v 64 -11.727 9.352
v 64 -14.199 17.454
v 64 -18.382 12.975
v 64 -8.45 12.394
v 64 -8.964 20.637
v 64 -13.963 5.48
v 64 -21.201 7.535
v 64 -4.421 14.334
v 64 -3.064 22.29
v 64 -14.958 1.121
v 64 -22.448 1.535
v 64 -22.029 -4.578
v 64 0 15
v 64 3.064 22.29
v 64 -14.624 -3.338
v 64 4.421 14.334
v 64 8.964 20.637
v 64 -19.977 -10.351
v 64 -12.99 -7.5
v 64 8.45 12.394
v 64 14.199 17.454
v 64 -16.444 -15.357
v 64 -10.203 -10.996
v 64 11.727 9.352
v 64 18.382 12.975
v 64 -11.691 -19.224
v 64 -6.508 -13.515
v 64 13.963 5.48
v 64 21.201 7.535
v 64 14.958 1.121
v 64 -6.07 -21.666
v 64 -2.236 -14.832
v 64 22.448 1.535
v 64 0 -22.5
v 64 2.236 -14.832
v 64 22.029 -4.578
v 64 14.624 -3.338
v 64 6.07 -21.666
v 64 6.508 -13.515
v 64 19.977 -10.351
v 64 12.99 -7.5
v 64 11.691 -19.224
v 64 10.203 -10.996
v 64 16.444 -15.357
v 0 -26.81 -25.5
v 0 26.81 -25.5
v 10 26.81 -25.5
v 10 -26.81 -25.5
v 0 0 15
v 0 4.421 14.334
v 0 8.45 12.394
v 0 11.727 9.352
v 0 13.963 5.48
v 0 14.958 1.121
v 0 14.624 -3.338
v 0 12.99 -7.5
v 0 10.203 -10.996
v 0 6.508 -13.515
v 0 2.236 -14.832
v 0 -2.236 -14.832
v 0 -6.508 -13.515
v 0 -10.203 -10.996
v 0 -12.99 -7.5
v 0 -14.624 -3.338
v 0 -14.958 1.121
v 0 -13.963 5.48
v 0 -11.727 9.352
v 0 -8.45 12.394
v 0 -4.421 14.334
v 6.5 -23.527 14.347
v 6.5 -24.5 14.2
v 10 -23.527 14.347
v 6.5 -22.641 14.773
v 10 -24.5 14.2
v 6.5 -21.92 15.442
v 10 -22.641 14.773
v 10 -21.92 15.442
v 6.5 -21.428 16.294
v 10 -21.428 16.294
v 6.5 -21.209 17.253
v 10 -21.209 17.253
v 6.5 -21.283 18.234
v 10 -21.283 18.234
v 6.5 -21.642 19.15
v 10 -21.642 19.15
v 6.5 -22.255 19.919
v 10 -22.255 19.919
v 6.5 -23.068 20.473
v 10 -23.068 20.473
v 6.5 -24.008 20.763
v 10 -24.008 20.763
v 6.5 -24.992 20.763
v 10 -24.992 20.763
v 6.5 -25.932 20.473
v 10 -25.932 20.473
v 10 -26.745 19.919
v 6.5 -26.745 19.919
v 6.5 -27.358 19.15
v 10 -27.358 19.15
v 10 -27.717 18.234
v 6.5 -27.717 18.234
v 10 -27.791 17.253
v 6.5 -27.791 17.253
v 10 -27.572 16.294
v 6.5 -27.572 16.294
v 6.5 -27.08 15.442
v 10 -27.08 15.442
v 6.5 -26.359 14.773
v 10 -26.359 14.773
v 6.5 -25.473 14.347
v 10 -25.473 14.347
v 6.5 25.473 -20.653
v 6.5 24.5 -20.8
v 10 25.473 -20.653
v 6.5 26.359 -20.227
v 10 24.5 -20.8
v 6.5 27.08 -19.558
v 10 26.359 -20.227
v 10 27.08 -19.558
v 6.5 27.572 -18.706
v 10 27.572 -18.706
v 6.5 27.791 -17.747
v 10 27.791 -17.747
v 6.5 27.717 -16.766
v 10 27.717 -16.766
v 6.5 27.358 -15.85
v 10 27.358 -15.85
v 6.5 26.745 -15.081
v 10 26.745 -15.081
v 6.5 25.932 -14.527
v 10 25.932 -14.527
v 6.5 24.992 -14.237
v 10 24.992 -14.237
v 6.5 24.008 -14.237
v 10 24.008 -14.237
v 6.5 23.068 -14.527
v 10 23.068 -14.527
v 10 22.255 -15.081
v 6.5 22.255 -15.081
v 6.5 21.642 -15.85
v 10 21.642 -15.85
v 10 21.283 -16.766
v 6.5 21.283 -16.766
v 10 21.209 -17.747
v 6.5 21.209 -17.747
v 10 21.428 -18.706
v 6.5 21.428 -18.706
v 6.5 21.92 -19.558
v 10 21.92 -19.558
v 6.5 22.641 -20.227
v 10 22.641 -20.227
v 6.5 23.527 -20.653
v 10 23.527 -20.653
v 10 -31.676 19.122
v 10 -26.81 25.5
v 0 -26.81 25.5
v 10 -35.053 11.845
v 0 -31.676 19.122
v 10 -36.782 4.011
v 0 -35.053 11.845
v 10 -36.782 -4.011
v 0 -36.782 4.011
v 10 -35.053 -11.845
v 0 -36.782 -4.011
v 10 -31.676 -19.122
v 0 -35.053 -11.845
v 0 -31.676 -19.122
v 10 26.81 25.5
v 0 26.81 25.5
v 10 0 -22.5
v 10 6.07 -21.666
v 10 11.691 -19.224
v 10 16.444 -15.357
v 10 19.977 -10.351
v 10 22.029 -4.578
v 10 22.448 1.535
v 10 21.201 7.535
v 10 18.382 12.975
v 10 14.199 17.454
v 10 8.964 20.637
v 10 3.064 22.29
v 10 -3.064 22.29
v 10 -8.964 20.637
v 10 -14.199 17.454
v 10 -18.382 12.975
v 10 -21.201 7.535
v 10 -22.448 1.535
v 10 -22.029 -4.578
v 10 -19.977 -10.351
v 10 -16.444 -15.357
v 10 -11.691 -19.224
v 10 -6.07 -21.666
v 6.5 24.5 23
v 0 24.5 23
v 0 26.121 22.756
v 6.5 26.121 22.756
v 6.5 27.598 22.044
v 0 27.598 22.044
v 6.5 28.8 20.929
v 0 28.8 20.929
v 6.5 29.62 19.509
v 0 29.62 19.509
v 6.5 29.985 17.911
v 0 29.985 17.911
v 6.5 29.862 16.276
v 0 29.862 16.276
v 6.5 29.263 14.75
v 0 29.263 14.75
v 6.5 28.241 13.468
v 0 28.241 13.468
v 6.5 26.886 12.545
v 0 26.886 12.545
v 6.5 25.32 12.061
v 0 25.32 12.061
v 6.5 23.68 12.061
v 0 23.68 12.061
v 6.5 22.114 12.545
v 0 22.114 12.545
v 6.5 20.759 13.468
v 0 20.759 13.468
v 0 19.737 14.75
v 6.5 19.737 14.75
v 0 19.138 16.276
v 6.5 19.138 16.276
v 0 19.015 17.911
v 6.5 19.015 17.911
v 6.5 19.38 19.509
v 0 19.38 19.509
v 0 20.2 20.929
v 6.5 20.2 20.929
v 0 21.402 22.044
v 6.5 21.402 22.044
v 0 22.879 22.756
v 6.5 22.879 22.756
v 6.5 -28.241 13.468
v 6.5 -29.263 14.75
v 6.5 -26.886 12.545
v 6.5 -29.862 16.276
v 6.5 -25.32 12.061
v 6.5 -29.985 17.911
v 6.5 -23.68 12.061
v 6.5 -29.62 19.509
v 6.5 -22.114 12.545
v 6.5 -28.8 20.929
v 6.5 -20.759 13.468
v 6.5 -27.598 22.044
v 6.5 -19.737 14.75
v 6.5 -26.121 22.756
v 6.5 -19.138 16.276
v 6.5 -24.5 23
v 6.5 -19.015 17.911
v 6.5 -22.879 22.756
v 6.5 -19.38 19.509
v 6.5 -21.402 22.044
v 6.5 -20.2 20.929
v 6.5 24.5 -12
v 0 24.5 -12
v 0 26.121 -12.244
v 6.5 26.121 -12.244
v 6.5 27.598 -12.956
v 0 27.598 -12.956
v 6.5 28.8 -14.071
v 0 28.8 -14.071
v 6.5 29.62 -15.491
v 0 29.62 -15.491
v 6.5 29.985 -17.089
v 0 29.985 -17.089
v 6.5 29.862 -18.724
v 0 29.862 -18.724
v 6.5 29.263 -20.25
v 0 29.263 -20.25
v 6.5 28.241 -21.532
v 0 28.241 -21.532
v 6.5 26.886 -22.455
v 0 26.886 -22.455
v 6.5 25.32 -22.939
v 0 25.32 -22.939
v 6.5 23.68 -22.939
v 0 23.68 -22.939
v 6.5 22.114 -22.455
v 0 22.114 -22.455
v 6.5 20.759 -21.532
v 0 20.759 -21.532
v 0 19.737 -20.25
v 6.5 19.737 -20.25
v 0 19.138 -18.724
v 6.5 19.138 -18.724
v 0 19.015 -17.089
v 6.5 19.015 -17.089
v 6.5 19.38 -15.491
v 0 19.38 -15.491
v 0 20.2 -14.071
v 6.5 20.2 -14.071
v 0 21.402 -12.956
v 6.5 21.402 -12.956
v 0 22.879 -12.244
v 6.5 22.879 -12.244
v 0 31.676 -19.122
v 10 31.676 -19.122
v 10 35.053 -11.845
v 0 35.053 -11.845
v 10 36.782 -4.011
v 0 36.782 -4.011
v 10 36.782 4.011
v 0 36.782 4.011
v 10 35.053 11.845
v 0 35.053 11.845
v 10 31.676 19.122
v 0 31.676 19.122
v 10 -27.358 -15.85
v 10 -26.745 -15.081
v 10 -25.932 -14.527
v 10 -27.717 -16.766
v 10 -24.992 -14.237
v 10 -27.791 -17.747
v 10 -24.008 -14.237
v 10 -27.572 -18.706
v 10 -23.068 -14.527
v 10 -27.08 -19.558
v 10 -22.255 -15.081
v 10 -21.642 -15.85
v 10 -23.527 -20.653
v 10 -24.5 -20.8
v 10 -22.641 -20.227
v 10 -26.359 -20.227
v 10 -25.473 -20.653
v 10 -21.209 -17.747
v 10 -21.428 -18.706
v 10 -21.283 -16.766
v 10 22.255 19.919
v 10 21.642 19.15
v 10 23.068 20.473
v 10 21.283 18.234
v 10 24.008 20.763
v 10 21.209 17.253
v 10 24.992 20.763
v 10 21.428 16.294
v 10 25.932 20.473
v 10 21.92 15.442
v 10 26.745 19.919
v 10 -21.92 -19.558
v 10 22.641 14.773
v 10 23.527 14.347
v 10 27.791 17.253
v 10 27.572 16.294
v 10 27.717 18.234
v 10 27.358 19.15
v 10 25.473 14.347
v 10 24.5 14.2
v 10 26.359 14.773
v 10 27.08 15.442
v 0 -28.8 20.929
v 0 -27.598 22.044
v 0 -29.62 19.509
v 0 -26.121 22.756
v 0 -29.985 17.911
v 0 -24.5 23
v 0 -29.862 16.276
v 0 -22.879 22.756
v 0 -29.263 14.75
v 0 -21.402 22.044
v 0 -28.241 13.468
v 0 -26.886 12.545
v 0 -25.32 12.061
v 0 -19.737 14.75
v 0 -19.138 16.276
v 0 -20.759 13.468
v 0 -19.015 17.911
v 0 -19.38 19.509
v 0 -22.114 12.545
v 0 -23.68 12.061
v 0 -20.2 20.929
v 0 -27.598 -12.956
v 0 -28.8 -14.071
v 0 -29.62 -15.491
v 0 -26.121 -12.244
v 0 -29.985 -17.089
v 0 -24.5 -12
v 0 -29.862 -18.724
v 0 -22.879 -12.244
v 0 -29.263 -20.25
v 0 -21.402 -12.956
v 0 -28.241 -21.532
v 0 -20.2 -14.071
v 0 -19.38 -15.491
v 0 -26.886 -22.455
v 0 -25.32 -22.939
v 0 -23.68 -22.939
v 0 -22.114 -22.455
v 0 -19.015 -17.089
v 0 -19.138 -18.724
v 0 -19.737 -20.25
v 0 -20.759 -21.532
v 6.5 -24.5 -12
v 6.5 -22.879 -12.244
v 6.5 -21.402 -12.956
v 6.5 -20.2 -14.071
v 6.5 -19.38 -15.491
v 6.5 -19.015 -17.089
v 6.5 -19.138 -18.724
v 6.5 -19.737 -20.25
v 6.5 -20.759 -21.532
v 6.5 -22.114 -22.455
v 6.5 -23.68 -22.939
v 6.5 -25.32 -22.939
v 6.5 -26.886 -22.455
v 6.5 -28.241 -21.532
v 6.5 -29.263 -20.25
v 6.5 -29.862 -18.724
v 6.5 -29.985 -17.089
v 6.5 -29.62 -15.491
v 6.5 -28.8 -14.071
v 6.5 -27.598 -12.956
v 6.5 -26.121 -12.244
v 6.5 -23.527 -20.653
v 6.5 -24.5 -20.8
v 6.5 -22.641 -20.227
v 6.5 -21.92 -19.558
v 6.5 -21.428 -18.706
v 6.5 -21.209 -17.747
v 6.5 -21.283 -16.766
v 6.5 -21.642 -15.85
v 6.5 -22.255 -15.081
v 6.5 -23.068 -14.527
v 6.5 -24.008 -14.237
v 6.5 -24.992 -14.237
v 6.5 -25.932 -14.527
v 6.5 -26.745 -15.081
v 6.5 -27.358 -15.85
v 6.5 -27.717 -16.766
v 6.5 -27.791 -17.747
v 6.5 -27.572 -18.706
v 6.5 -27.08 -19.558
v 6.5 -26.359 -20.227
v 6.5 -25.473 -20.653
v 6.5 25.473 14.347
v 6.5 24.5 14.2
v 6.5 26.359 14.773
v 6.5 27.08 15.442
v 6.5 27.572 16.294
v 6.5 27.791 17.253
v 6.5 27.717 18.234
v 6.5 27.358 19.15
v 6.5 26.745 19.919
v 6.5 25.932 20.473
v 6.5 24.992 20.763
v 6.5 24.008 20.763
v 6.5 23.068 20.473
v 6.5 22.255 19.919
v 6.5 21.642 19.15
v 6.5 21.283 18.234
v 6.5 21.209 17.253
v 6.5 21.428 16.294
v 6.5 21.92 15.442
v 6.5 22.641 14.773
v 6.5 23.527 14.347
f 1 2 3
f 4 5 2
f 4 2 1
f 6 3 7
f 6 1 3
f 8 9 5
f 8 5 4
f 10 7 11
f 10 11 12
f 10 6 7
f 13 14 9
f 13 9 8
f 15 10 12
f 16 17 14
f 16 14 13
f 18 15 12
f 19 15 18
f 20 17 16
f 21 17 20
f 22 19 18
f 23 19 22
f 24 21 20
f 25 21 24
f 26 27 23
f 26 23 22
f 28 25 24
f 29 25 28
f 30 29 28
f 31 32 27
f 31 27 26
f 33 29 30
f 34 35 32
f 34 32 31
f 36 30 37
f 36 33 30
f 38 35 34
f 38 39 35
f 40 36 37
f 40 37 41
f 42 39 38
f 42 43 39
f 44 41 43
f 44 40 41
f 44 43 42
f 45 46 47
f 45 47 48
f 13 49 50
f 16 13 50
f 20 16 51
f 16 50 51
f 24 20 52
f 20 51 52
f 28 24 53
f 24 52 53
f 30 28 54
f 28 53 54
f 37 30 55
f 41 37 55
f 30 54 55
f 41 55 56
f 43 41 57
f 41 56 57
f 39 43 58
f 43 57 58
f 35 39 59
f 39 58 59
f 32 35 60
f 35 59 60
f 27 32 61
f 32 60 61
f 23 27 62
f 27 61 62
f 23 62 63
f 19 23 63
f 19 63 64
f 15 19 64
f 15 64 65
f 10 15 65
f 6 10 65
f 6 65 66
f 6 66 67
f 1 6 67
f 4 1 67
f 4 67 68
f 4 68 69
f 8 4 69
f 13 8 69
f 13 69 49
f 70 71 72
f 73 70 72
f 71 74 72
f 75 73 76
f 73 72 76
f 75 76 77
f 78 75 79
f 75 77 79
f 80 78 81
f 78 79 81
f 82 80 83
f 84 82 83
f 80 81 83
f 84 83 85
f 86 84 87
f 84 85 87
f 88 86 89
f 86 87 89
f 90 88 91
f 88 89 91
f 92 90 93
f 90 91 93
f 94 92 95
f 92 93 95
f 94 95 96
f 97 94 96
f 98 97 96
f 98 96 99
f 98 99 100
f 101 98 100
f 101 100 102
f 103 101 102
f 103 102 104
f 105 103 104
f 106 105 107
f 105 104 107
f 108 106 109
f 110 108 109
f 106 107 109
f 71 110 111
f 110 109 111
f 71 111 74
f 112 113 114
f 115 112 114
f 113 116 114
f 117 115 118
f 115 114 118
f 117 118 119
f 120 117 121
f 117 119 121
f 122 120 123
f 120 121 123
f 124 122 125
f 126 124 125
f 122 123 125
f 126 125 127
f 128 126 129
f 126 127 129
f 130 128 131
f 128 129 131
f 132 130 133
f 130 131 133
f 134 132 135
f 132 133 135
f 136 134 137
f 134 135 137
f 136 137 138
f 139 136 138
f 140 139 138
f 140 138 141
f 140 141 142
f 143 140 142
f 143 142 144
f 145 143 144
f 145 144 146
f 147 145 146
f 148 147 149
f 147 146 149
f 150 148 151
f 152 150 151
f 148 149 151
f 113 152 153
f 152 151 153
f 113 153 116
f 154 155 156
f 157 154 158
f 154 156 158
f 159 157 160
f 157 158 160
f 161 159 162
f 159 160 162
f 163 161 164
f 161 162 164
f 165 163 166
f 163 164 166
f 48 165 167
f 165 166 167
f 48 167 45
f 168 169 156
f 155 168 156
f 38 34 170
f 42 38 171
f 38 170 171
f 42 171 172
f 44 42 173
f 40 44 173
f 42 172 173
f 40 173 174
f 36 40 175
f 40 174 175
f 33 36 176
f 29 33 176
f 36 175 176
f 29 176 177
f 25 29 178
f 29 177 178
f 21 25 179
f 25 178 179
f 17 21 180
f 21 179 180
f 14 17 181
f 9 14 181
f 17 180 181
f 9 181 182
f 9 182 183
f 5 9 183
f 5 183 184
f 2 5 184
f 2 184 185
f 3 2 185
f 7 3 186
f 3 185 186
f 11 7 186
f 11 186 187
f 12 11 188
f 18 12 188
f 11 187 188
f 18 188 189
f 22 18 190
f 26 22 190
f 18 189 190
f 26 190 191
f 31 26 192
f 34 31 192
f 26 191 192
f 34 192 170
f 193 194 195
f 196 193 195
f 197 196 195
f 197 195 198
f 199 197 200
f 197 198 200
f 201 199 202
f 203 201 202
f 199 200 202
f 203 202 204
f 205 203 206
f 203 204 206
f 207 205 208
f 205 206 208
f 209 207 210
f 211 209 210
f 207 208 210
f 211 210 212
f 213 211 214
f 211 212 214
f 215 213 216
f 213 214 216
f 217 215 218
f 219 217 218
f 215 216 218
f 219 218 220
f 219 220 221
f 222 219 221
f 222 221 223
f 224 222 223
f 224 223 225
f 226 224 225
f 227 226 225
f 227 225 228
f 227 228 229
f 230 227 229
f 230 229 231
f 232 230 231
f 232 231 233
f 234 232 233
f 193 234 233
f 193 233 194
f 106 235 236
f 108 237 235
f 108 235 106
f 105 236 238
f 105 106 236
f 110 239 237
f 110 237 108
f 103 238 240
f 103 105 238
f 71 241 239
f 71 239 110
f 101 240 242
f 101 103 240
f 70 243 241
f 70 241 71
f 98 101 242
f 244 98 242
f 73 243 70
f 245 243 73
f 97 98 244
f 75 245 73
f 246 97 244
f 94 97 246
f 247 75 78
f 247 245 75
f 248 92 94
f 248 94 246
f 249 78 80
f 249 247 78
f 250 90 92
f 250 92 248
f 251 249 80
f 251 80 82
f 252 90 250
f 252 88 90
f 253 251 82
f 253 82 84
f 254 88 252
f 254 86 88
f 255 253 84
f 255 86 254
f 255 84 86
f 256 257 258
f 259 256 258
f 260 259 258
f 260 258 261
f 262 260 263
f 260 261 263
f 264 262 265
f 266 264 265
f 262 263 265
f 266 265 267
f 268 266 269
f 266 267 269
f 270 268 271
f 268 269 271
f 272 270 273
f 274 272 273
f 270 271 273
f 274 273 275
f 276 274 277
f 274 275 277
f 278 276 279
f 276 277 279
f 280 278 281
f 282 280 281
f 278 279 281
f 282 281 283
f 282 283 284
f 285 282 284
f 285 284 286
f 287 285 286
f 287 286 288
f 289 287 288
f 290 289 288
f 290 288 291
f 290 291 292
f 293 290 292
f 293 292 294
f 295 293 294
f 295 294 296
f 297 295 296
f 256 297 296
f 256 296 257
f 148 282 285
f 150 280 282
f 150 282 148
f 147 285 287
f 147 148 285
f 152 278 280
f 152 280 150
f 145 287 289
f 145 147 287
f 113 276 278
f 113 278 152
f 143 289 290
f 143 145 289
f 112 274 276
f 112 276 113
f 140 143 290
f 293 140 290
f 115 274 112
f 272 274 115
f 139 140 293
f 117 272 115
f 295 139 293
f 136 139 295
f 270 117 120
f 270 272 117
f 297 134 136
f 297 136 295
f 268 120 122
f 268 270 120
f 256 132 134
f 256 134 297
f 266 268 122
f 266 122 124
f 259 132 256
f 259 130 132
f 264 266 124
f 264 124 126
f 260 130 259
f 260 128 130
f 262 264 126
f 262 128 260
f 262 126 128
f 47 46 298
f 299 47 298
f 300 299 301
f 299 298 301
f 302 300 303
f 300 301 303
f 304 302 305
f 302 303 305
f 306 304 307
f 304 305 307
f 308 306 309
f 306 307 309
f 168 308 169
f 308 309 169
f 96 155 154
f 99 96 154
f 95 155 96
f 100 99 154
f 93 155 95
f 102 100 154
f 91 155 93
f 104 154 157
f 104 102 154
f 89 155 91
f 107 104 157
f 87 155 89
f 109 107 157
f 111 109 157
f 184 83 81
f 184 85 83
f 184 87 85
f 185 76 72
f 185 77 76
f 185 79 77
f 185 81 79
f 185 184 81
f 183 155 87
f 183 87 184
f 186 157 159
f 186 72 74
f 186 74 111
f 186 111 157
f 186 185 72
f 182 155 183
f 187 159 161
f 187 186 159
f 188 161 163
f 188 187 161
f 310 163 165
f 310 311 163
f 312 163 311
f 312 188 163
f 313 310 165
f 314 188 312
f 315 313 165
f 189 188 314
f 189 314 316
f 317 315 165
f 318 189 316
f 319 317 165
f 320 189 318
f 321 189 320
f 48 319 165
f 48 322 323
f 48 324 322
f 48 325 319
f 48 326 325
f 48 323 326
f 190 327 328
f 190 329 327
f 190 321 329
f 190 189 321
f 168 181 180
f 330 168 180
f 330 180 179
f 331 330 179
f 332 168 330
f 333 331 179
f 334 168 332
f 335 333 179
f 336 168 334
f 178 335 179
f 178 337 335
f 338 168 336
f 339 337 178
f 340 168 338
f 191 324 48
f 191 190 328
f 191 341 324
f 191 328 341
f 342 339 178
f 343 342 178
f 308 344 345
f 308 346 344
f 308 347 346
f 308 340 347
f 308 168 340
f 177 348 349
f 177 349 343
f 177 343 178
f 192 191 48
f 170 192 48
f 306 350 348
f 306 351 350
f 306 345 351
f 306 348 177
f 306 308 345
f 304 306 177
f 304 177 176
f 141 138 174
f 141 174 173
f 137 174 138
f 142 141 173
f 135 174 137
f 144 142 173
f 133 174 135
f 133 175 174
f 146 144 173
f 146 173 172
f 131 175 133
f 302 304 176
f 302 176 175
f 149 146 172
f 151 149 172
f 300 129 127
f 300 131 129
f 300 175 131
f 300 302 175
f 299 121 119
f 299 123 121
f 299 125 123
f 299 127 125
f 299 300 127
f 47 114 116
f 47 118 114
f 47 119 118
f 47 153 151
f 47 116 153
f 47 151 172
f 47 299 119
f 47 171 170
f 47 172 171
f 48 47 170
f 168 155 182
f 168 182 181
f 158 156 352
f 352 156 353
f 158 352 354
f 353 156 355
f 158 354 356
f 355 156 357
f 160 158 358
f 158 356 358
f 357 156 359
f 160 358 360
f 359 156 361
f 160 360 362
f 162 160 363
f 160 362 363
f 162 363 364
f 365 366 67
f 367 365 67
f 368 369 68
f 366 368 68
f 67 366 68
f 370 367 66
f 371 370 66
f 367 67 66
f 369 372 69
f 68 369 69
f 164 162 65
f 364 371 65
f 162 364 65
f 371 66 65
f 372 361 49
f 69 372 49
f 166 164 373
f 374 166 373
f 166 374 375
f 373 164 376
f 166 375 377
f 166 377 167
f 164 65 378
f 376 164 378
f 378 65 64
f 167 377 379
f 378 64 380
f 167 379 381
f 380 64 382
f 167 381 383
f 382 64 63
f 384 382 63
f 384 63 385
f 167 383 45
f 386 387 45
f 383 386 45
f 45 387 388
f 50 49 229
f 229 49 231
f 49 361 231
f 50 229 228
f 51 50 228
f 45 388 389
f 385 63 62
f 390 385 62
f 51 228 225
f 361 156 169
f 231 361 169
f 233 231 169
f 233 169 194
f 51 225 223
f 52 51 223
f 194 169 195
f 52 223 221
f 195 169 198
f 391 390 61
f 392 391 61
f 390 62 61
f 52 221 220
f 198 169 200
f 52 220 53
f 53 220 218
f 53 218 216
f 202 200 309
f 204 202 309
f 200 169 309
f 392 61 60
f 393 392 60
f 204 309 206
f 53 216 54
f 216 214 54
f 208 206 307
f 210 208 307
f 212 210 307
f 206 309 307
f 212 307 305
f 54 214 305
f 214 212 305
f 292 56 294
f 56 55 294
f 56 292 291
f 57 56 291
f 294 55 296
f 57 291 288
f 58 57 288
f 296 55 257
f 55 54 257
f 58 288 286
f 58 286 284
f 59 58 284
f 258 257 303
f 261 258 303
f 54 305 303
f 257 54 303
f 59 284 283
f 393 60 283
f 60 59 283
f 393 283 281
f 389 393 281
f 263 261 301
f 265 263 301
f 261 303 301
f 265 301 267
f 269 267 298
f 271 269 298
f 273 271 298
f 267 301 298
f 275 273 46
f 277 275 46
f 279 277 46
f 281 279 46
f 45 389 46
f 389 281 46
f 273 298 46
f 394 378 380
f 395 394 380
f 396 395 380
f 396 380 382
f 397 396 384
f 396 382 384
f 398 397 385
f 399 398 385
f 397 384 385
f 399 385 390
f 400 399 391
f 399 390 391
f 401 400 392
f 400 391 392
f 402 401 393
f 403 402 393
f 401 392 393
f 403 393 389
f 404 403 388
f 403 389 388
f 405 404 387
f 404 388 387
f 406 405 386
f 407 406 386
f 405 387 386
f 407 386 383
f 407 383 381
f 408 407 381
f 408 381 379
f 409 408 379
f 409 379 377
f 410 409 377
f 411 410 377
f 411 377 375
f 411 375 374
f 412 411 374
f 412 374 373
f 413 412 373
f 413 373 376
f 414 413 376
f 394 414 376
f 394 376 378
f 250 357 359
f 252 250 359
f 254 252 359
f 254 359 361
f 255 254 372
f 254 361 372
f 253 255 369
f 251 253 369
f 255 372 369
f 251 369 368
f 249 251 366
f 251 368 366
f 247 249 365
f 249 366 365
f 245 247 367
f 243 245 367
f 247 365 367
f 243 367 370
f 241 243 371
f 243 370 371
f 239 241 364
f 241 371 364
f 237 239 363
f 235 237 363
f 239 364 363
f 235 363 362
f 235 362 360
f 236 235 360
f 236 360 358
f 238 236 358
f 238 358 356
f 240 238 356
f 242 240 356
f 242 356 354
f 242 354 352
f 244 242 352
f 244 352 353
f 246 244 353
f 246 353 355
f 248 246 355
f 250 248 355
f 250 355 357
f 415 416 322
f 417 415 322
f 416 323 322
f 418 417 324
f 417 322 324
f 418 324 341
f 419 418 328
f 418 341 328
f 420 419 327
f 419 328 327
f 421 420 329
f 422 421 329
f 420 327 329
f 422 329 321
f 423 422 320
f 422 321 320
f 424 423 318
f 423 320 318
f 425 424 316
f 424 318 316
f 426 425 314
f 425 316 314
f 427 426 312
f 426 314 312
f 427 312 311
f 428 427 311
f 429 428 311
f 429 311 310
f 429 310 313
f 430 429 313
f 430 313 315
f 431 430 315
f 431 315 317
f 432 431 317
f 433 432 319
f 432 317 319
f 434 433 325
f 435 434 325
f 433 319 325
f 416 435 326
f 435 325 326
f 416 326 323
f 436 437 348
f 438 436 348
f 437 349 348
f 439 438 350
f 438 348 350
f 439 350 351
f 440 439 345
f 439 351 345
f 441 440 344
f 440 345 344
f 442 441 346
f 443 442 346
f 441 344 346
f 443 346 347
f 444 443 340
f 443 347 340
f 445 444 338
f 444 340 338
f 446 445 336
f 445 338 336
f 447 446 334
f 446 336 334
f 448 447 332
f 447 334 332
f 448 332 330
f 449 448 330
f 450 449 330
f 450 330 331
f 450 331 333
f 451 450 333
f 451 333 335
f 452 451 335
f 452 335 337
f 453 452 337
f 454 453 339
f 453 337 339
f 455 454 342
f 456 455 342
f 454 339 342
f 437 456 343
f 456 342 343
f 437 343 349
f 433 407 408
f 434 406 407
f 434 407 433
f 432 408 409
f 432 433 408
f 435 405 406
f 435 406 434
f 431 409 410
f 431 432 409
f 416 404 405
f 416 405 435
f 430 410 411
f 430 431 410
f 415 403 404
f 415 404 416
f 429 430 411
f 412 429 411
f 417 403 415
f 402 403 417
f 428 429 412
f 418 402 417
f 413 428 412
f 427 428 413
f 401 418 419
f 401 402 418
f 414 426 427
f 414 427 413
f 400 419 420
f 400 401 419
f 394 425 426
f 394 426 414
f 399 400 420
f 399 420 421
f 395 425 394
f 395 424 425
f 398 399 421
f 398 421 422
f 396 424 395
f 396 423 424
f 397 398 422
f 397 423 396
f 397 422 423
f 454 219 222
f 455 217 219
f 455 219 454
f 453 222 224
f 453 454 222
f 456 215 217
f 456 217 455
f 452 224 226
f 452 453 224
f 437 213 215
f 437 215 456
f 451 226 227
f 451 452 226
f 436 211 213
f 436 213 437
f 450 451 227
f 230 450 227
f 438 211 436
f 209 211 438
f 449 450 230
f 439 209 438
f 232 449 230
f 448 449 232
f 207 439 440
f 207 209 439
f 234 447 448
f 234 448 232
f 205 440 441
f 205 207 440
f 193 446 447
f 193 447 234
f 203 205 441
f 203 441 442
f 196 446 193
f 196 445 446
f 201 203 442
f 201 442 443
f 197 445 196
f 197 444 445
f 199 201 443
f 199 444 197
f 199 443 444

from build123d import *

# Parameters (mm, degrees)
SKETCH_1_R                   = 37
EXTRUDE_1_DEPTH              = 10
SKETCH_2_R                   = 22.5
EXTRUDE_2_DEPTH              = 54
SKETCH_3_R                   = 15
CUT_EXTRUDE_1_DEPTH          = 65
CUT_EXTRUDE_2_DEPTH          = 65
HOLE_WIZARD_M6_2_D           = 6.6
HOLE_WIZARD_M6_2_CBORE_D     = 11
HOLE_WIZARD_M6_2_CBORE_DEPTH = 6.5


with BuildPart() as part:
    # 草图1 → 凸台-拉伸1 (new body)
    with BuildSketch(Plane(origin=(0, 0, 0), x_dir=(0, 0, -1), z_dir=(1, 0, 0))):
        Circle(SKETCH_1_R)
    extrude(amount=EXTRUDE_1_DEPTH)

    # 草图2 → 凸台-拉伸2 (add)
    with BuildSketch(Plane(origin=(10, 0, 0), x_dir=(0, 0, -1), z_dir=(1, 0, 0))):
        Circle(SKETCH_2_R)
    extrude(amount=EXTRUDE_2_DEPTH)

    # 草图3 → 切除-拉伸1 (cut, through all)
    with BuildSketch(Plane.ZY):
        Circle(SKETCH_3_R)
    extrude(amount=-CUT_EXTRUDE_1_DEPTH, mode=Mode.SUBTRACT)

    # 草图6 → 切除-拉伸2 (cut, through all)
    with BuildSketch(Plane.ZY):
        with BuildLine():
            Line((-25.5, 26.809513237), (-25.5, -26.809513237))
            ThreePointArc((-25.5, -26.809513237), (-37, 0), (-25.5, 26.809513237))
        make_face()
        with BuildLine():
            Line((25.5, 26.809513237), (25.5, -26.809513237))
            ThreePointArc((25.5, -26.809513237), (37, 0), (25.5, 26.809513237))
        make_face()
    extrude(amount=-CUT_EXTRUDE_2_DEPTH, mode=Mode.SUBTRACT)

    # M6 六角头螺栓的柱形沉头孔2 (through all)
    with Locations(Plane.ZY):
        with Locations((-17.5, 24.5), (17.5, 24.5), (17.5, -24.5), (-17.5, -24.5)):
            CounterBoreHole(HOLE_WIZARD_M6_2_D / 2, HOLE_WIZARD_M6_2_CBORE_D / 2, HOLE_WIZARD_M6_2_CBORE_DEPTH)


solid = part.part
